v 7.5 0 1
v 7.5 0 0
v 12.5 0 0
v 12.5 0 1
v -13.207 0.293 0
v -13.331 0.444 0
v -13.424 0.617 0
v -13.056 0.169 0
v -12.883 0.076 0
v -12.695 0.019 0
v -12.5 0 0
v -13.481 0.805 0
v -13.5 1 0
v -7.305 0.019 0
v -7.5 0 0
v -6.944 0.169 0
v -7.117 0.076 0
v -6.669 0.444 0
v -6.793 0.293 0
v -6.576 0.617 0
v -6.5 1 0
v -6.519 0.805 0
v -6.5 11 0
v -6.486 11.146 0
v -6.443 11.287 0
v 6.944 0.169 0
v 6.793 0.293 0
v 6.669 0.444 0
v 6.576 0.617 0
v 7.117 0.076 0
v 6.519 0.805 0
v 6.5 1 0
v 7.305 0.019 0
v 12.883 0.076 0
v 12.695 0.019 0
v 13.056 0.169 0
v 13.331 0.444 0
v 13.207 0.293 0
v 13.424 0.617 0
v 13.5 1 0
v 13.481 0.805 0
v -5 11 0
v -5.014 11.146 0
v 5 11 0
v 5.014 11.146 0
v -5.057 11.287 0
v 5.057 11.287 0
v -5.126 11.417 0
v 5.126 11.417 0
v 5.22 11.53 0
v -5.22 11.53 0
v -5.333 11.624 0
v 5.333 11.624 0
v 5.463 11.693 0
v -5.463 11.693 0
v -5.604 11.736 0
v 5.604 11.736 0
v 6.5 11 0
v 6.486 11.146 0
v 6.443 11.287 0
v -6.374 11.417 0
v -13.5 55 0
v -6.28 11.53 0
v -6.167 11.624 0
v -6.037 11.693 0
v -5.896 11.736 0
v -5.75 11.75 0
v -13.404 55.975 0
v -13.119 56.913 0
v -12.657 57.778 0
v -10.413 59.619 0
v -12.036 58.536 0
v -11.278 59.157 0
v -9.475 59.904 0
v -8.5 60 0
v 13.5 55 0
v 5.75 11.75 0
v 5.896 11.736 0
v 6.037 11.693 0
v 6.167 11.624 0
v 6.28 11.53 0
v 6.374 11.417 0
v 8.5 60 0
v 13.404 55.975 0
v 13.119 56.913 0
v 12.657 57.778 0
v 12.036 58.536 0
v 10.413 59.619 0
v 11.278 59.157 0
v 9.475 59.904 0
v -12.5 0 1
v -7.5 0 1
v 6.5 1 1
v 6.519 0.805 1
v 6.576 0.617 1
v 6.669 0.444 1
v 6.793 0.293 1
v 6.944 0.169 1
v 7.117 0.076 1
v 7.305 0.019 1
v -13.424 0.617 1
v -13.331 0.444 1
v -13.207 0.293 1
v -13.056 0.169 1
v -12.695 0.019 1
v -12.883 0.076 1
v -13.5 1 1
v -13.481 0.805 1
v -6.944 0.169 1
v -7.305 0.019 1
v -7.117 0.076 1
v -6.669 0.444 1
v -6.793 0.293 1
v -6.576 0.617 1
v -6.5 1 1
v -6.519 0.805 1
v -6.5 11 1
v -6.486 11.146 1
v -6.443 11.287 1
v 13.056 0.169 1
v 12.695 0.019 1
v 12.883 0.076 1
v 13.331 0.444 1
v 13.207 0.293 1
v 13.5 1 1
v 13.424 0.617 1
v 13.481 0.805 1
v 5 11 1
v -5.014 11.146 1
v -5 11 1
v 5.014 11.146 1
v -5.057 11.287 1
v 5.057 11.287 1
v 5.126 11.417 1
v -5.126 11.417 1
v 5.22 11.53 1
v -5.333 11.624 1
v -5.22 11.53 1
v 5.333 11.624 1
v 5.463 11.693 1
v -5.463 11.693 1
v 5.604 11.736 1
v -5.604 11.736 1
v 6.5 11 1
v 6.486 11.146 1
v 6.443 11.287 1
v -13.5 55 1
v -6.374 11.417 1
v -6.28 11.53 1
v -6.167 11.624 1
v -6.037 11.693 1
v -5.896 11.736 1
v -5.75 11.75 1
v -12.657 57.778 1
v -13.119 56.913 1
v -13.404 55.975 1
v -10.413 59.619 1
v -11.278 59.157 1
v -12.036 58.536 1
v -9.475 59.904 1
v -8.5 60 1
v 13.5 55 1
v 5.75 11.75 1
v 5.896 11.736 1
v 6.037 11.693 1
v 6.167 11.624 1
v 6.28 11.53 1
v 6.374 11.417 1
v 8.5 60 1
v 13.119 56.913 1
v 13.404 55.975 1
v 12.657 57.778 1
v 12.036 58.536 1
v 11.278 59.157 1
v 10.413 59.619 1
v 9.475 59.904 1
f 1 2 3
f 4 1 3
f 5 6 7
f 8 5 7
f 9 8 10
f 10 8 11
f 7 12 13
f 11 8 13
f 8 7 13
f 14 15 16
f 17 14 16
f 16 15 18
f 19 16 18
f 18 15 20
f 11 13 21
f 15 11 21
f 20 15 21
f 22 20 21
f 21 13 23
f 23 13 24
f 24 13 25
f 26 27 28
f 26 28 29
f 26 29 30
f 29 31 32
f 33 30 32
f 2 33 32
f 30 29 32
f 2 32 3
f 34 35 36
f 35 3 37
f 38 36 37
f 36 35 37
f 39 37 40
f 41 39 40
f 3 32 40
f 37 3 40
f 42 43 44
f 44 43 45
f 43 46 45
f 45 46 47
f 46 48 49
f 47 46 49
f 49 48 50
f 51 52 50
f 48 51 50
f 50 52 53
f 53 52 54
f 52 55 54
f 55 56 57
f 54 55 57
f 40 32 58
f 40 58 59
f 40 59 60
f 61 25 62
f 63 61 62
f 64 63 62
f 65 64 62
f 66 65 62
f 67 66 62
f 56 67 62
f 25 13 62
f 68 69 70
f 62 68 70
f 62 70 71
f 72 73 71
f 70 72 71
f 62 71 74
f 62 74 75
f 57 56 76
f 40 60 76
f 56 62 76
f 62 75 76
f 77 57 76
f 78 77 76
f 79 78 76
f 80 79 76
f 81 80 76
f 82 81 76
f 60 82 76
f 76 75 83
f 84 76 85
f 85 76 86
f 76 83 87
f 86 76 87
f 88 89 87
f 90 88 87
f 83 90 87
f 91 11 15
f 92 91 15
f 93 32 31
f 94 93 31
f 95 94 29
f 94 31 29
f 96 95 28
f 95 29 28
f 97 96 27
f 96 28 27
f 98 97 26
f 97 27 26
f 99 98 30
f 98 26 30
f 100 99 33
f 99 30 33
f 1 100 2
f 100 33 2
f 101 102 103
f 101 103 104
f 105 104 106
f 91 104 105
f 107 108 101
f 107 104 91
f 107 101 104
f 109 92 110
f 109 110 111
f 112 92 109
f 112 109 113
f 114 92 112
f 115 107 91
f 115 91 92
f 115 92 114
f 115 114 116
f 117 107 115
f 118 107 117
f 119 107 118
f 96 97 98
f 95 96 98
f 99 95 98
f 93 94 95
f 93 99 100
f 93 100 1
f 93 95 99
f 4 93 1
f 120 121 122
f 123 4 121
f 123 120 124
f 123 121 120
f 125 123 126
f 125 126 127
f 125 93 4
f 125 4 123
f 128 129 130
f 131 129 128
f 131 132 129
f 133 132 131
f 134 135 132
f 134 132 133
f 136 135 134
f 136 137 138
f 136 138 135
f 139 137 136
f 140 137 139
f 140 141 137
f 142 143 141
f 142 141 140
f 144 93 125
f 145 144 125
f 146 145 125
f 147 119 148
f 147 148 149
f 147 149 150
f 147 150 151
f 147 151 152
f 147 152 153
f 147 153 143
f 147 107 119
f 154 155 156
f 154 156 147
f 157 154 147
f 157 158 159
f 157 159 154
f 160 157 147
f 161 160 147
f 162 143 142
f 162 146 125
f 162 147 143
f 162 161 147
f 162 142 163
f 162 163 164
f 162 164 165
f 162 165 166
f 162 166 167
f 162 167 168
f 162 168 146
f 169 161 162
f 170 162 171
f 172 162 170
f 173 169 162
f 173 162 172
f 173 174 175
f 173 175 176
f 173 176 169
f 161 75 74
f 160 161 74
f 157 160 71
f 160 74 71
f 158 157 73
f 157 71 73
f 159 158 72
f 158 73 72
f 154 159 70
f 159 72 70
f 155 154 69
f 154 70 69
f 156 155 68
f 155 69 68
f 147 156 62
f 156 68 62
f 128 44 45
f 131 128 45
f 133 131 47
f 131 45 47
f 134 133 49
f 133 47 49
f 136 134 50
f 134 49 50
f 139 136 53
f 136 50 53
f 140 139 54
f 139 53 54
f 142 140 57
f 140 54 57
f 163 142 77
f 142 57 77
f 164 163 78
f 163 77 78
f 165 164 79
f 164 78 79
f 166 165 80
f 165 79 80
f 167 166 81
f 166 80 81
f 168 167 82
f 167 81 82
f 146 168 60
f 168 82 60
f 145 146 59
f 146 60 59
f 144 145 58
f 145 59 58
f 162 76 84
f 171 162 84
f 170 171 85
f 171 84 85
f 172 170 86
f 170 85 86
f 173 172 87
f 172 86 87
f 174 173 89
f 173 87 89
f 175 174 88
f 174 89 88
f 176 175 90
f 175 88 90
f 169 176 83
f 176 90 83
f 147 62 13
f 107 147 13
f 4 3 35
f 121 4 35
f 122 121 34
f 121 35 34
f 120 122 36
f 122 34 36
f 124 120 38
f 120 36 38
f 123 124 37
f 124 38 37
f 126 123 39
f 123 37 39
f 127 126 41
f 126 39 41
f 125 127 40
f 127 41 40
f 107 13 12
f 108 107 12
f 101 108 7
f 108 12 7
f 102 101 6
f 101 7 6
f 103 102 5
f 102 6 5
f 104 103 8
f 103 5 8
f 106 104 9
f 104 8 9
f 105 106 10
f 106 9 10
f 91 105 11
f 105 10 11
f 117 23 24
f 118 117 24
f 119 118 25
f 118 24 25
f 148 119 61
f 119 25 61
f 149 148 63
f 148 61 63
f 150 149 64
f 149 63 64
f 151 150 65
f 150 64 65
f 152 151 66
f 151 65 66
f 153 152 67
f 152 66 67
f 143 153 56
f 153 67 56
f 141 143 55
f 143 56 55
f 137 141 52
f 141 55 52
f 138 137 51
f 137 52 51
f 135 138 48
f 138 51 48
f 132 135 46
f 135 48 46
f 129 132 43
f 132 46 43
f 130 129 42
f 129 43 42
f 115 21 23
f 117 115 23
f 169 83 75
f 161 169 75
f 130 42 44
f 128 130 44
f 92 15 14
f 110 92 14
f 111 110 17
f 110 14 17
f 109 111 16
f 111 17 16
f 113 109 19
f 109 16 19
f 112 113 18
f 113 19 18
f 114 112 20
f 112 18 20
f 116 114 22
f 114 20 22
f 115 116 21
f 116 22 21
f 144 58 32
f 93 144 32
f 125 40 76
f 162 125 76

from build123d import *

# Parameters (mm, degrees)
F1_DEPTH = 1


with BuildPart() as f1:
    # F0 (on Top) → F1 (new body)
    with BuildSketch(Plane.XY):
        with BuildLine():
            ThreePointArc((-13.5, 1), (-13.207107, 0.292893), (-12.5, 0))
            Line((-12.5, 0), (-7.5, 0))
            ThreePointArc((-7.5, 0), (-6.792893, 0.292893), (-6.5, 1))
            Line((-6.5, 1), (-6.5, 11))
            ThreePointArc((-6.5, 11), (-5.75, 11.75), (-5, 11))
            Line((-5, 11), (0, 11))
            Line((0, 11), (5, 11))
            ThreePointArc((5, 11), (5.75, 11.75), (6.5, 11))
            Line((6.5, 11), (6.5, 1))
            ThreePointArc((6.5, 1), (6.792893, 0.292893), (7.5, 0))
            Line((7.5, 0), (12.5, 0))
            ThreePointArc((12.5, 0), (13.207107, 0.292893), (13.5, 1))
            Line((13.5, 1), (13.5, 55))
            ThreePointArc((13.5, 55), (12.035534, 58.535534), (8.5, 60))
            Line((8.5, 60), (0, 60))
            Line((0, 60), (-8.5, 60))
            ThreePointArc((-8.5, 60), (-12.035534, 58.535534), (-13.5, 55))
            Line((-13.5, 55), (-13.5, 1))
        make_face()
    extrude(amount=F1_DEPTH)


solid = f1.part
